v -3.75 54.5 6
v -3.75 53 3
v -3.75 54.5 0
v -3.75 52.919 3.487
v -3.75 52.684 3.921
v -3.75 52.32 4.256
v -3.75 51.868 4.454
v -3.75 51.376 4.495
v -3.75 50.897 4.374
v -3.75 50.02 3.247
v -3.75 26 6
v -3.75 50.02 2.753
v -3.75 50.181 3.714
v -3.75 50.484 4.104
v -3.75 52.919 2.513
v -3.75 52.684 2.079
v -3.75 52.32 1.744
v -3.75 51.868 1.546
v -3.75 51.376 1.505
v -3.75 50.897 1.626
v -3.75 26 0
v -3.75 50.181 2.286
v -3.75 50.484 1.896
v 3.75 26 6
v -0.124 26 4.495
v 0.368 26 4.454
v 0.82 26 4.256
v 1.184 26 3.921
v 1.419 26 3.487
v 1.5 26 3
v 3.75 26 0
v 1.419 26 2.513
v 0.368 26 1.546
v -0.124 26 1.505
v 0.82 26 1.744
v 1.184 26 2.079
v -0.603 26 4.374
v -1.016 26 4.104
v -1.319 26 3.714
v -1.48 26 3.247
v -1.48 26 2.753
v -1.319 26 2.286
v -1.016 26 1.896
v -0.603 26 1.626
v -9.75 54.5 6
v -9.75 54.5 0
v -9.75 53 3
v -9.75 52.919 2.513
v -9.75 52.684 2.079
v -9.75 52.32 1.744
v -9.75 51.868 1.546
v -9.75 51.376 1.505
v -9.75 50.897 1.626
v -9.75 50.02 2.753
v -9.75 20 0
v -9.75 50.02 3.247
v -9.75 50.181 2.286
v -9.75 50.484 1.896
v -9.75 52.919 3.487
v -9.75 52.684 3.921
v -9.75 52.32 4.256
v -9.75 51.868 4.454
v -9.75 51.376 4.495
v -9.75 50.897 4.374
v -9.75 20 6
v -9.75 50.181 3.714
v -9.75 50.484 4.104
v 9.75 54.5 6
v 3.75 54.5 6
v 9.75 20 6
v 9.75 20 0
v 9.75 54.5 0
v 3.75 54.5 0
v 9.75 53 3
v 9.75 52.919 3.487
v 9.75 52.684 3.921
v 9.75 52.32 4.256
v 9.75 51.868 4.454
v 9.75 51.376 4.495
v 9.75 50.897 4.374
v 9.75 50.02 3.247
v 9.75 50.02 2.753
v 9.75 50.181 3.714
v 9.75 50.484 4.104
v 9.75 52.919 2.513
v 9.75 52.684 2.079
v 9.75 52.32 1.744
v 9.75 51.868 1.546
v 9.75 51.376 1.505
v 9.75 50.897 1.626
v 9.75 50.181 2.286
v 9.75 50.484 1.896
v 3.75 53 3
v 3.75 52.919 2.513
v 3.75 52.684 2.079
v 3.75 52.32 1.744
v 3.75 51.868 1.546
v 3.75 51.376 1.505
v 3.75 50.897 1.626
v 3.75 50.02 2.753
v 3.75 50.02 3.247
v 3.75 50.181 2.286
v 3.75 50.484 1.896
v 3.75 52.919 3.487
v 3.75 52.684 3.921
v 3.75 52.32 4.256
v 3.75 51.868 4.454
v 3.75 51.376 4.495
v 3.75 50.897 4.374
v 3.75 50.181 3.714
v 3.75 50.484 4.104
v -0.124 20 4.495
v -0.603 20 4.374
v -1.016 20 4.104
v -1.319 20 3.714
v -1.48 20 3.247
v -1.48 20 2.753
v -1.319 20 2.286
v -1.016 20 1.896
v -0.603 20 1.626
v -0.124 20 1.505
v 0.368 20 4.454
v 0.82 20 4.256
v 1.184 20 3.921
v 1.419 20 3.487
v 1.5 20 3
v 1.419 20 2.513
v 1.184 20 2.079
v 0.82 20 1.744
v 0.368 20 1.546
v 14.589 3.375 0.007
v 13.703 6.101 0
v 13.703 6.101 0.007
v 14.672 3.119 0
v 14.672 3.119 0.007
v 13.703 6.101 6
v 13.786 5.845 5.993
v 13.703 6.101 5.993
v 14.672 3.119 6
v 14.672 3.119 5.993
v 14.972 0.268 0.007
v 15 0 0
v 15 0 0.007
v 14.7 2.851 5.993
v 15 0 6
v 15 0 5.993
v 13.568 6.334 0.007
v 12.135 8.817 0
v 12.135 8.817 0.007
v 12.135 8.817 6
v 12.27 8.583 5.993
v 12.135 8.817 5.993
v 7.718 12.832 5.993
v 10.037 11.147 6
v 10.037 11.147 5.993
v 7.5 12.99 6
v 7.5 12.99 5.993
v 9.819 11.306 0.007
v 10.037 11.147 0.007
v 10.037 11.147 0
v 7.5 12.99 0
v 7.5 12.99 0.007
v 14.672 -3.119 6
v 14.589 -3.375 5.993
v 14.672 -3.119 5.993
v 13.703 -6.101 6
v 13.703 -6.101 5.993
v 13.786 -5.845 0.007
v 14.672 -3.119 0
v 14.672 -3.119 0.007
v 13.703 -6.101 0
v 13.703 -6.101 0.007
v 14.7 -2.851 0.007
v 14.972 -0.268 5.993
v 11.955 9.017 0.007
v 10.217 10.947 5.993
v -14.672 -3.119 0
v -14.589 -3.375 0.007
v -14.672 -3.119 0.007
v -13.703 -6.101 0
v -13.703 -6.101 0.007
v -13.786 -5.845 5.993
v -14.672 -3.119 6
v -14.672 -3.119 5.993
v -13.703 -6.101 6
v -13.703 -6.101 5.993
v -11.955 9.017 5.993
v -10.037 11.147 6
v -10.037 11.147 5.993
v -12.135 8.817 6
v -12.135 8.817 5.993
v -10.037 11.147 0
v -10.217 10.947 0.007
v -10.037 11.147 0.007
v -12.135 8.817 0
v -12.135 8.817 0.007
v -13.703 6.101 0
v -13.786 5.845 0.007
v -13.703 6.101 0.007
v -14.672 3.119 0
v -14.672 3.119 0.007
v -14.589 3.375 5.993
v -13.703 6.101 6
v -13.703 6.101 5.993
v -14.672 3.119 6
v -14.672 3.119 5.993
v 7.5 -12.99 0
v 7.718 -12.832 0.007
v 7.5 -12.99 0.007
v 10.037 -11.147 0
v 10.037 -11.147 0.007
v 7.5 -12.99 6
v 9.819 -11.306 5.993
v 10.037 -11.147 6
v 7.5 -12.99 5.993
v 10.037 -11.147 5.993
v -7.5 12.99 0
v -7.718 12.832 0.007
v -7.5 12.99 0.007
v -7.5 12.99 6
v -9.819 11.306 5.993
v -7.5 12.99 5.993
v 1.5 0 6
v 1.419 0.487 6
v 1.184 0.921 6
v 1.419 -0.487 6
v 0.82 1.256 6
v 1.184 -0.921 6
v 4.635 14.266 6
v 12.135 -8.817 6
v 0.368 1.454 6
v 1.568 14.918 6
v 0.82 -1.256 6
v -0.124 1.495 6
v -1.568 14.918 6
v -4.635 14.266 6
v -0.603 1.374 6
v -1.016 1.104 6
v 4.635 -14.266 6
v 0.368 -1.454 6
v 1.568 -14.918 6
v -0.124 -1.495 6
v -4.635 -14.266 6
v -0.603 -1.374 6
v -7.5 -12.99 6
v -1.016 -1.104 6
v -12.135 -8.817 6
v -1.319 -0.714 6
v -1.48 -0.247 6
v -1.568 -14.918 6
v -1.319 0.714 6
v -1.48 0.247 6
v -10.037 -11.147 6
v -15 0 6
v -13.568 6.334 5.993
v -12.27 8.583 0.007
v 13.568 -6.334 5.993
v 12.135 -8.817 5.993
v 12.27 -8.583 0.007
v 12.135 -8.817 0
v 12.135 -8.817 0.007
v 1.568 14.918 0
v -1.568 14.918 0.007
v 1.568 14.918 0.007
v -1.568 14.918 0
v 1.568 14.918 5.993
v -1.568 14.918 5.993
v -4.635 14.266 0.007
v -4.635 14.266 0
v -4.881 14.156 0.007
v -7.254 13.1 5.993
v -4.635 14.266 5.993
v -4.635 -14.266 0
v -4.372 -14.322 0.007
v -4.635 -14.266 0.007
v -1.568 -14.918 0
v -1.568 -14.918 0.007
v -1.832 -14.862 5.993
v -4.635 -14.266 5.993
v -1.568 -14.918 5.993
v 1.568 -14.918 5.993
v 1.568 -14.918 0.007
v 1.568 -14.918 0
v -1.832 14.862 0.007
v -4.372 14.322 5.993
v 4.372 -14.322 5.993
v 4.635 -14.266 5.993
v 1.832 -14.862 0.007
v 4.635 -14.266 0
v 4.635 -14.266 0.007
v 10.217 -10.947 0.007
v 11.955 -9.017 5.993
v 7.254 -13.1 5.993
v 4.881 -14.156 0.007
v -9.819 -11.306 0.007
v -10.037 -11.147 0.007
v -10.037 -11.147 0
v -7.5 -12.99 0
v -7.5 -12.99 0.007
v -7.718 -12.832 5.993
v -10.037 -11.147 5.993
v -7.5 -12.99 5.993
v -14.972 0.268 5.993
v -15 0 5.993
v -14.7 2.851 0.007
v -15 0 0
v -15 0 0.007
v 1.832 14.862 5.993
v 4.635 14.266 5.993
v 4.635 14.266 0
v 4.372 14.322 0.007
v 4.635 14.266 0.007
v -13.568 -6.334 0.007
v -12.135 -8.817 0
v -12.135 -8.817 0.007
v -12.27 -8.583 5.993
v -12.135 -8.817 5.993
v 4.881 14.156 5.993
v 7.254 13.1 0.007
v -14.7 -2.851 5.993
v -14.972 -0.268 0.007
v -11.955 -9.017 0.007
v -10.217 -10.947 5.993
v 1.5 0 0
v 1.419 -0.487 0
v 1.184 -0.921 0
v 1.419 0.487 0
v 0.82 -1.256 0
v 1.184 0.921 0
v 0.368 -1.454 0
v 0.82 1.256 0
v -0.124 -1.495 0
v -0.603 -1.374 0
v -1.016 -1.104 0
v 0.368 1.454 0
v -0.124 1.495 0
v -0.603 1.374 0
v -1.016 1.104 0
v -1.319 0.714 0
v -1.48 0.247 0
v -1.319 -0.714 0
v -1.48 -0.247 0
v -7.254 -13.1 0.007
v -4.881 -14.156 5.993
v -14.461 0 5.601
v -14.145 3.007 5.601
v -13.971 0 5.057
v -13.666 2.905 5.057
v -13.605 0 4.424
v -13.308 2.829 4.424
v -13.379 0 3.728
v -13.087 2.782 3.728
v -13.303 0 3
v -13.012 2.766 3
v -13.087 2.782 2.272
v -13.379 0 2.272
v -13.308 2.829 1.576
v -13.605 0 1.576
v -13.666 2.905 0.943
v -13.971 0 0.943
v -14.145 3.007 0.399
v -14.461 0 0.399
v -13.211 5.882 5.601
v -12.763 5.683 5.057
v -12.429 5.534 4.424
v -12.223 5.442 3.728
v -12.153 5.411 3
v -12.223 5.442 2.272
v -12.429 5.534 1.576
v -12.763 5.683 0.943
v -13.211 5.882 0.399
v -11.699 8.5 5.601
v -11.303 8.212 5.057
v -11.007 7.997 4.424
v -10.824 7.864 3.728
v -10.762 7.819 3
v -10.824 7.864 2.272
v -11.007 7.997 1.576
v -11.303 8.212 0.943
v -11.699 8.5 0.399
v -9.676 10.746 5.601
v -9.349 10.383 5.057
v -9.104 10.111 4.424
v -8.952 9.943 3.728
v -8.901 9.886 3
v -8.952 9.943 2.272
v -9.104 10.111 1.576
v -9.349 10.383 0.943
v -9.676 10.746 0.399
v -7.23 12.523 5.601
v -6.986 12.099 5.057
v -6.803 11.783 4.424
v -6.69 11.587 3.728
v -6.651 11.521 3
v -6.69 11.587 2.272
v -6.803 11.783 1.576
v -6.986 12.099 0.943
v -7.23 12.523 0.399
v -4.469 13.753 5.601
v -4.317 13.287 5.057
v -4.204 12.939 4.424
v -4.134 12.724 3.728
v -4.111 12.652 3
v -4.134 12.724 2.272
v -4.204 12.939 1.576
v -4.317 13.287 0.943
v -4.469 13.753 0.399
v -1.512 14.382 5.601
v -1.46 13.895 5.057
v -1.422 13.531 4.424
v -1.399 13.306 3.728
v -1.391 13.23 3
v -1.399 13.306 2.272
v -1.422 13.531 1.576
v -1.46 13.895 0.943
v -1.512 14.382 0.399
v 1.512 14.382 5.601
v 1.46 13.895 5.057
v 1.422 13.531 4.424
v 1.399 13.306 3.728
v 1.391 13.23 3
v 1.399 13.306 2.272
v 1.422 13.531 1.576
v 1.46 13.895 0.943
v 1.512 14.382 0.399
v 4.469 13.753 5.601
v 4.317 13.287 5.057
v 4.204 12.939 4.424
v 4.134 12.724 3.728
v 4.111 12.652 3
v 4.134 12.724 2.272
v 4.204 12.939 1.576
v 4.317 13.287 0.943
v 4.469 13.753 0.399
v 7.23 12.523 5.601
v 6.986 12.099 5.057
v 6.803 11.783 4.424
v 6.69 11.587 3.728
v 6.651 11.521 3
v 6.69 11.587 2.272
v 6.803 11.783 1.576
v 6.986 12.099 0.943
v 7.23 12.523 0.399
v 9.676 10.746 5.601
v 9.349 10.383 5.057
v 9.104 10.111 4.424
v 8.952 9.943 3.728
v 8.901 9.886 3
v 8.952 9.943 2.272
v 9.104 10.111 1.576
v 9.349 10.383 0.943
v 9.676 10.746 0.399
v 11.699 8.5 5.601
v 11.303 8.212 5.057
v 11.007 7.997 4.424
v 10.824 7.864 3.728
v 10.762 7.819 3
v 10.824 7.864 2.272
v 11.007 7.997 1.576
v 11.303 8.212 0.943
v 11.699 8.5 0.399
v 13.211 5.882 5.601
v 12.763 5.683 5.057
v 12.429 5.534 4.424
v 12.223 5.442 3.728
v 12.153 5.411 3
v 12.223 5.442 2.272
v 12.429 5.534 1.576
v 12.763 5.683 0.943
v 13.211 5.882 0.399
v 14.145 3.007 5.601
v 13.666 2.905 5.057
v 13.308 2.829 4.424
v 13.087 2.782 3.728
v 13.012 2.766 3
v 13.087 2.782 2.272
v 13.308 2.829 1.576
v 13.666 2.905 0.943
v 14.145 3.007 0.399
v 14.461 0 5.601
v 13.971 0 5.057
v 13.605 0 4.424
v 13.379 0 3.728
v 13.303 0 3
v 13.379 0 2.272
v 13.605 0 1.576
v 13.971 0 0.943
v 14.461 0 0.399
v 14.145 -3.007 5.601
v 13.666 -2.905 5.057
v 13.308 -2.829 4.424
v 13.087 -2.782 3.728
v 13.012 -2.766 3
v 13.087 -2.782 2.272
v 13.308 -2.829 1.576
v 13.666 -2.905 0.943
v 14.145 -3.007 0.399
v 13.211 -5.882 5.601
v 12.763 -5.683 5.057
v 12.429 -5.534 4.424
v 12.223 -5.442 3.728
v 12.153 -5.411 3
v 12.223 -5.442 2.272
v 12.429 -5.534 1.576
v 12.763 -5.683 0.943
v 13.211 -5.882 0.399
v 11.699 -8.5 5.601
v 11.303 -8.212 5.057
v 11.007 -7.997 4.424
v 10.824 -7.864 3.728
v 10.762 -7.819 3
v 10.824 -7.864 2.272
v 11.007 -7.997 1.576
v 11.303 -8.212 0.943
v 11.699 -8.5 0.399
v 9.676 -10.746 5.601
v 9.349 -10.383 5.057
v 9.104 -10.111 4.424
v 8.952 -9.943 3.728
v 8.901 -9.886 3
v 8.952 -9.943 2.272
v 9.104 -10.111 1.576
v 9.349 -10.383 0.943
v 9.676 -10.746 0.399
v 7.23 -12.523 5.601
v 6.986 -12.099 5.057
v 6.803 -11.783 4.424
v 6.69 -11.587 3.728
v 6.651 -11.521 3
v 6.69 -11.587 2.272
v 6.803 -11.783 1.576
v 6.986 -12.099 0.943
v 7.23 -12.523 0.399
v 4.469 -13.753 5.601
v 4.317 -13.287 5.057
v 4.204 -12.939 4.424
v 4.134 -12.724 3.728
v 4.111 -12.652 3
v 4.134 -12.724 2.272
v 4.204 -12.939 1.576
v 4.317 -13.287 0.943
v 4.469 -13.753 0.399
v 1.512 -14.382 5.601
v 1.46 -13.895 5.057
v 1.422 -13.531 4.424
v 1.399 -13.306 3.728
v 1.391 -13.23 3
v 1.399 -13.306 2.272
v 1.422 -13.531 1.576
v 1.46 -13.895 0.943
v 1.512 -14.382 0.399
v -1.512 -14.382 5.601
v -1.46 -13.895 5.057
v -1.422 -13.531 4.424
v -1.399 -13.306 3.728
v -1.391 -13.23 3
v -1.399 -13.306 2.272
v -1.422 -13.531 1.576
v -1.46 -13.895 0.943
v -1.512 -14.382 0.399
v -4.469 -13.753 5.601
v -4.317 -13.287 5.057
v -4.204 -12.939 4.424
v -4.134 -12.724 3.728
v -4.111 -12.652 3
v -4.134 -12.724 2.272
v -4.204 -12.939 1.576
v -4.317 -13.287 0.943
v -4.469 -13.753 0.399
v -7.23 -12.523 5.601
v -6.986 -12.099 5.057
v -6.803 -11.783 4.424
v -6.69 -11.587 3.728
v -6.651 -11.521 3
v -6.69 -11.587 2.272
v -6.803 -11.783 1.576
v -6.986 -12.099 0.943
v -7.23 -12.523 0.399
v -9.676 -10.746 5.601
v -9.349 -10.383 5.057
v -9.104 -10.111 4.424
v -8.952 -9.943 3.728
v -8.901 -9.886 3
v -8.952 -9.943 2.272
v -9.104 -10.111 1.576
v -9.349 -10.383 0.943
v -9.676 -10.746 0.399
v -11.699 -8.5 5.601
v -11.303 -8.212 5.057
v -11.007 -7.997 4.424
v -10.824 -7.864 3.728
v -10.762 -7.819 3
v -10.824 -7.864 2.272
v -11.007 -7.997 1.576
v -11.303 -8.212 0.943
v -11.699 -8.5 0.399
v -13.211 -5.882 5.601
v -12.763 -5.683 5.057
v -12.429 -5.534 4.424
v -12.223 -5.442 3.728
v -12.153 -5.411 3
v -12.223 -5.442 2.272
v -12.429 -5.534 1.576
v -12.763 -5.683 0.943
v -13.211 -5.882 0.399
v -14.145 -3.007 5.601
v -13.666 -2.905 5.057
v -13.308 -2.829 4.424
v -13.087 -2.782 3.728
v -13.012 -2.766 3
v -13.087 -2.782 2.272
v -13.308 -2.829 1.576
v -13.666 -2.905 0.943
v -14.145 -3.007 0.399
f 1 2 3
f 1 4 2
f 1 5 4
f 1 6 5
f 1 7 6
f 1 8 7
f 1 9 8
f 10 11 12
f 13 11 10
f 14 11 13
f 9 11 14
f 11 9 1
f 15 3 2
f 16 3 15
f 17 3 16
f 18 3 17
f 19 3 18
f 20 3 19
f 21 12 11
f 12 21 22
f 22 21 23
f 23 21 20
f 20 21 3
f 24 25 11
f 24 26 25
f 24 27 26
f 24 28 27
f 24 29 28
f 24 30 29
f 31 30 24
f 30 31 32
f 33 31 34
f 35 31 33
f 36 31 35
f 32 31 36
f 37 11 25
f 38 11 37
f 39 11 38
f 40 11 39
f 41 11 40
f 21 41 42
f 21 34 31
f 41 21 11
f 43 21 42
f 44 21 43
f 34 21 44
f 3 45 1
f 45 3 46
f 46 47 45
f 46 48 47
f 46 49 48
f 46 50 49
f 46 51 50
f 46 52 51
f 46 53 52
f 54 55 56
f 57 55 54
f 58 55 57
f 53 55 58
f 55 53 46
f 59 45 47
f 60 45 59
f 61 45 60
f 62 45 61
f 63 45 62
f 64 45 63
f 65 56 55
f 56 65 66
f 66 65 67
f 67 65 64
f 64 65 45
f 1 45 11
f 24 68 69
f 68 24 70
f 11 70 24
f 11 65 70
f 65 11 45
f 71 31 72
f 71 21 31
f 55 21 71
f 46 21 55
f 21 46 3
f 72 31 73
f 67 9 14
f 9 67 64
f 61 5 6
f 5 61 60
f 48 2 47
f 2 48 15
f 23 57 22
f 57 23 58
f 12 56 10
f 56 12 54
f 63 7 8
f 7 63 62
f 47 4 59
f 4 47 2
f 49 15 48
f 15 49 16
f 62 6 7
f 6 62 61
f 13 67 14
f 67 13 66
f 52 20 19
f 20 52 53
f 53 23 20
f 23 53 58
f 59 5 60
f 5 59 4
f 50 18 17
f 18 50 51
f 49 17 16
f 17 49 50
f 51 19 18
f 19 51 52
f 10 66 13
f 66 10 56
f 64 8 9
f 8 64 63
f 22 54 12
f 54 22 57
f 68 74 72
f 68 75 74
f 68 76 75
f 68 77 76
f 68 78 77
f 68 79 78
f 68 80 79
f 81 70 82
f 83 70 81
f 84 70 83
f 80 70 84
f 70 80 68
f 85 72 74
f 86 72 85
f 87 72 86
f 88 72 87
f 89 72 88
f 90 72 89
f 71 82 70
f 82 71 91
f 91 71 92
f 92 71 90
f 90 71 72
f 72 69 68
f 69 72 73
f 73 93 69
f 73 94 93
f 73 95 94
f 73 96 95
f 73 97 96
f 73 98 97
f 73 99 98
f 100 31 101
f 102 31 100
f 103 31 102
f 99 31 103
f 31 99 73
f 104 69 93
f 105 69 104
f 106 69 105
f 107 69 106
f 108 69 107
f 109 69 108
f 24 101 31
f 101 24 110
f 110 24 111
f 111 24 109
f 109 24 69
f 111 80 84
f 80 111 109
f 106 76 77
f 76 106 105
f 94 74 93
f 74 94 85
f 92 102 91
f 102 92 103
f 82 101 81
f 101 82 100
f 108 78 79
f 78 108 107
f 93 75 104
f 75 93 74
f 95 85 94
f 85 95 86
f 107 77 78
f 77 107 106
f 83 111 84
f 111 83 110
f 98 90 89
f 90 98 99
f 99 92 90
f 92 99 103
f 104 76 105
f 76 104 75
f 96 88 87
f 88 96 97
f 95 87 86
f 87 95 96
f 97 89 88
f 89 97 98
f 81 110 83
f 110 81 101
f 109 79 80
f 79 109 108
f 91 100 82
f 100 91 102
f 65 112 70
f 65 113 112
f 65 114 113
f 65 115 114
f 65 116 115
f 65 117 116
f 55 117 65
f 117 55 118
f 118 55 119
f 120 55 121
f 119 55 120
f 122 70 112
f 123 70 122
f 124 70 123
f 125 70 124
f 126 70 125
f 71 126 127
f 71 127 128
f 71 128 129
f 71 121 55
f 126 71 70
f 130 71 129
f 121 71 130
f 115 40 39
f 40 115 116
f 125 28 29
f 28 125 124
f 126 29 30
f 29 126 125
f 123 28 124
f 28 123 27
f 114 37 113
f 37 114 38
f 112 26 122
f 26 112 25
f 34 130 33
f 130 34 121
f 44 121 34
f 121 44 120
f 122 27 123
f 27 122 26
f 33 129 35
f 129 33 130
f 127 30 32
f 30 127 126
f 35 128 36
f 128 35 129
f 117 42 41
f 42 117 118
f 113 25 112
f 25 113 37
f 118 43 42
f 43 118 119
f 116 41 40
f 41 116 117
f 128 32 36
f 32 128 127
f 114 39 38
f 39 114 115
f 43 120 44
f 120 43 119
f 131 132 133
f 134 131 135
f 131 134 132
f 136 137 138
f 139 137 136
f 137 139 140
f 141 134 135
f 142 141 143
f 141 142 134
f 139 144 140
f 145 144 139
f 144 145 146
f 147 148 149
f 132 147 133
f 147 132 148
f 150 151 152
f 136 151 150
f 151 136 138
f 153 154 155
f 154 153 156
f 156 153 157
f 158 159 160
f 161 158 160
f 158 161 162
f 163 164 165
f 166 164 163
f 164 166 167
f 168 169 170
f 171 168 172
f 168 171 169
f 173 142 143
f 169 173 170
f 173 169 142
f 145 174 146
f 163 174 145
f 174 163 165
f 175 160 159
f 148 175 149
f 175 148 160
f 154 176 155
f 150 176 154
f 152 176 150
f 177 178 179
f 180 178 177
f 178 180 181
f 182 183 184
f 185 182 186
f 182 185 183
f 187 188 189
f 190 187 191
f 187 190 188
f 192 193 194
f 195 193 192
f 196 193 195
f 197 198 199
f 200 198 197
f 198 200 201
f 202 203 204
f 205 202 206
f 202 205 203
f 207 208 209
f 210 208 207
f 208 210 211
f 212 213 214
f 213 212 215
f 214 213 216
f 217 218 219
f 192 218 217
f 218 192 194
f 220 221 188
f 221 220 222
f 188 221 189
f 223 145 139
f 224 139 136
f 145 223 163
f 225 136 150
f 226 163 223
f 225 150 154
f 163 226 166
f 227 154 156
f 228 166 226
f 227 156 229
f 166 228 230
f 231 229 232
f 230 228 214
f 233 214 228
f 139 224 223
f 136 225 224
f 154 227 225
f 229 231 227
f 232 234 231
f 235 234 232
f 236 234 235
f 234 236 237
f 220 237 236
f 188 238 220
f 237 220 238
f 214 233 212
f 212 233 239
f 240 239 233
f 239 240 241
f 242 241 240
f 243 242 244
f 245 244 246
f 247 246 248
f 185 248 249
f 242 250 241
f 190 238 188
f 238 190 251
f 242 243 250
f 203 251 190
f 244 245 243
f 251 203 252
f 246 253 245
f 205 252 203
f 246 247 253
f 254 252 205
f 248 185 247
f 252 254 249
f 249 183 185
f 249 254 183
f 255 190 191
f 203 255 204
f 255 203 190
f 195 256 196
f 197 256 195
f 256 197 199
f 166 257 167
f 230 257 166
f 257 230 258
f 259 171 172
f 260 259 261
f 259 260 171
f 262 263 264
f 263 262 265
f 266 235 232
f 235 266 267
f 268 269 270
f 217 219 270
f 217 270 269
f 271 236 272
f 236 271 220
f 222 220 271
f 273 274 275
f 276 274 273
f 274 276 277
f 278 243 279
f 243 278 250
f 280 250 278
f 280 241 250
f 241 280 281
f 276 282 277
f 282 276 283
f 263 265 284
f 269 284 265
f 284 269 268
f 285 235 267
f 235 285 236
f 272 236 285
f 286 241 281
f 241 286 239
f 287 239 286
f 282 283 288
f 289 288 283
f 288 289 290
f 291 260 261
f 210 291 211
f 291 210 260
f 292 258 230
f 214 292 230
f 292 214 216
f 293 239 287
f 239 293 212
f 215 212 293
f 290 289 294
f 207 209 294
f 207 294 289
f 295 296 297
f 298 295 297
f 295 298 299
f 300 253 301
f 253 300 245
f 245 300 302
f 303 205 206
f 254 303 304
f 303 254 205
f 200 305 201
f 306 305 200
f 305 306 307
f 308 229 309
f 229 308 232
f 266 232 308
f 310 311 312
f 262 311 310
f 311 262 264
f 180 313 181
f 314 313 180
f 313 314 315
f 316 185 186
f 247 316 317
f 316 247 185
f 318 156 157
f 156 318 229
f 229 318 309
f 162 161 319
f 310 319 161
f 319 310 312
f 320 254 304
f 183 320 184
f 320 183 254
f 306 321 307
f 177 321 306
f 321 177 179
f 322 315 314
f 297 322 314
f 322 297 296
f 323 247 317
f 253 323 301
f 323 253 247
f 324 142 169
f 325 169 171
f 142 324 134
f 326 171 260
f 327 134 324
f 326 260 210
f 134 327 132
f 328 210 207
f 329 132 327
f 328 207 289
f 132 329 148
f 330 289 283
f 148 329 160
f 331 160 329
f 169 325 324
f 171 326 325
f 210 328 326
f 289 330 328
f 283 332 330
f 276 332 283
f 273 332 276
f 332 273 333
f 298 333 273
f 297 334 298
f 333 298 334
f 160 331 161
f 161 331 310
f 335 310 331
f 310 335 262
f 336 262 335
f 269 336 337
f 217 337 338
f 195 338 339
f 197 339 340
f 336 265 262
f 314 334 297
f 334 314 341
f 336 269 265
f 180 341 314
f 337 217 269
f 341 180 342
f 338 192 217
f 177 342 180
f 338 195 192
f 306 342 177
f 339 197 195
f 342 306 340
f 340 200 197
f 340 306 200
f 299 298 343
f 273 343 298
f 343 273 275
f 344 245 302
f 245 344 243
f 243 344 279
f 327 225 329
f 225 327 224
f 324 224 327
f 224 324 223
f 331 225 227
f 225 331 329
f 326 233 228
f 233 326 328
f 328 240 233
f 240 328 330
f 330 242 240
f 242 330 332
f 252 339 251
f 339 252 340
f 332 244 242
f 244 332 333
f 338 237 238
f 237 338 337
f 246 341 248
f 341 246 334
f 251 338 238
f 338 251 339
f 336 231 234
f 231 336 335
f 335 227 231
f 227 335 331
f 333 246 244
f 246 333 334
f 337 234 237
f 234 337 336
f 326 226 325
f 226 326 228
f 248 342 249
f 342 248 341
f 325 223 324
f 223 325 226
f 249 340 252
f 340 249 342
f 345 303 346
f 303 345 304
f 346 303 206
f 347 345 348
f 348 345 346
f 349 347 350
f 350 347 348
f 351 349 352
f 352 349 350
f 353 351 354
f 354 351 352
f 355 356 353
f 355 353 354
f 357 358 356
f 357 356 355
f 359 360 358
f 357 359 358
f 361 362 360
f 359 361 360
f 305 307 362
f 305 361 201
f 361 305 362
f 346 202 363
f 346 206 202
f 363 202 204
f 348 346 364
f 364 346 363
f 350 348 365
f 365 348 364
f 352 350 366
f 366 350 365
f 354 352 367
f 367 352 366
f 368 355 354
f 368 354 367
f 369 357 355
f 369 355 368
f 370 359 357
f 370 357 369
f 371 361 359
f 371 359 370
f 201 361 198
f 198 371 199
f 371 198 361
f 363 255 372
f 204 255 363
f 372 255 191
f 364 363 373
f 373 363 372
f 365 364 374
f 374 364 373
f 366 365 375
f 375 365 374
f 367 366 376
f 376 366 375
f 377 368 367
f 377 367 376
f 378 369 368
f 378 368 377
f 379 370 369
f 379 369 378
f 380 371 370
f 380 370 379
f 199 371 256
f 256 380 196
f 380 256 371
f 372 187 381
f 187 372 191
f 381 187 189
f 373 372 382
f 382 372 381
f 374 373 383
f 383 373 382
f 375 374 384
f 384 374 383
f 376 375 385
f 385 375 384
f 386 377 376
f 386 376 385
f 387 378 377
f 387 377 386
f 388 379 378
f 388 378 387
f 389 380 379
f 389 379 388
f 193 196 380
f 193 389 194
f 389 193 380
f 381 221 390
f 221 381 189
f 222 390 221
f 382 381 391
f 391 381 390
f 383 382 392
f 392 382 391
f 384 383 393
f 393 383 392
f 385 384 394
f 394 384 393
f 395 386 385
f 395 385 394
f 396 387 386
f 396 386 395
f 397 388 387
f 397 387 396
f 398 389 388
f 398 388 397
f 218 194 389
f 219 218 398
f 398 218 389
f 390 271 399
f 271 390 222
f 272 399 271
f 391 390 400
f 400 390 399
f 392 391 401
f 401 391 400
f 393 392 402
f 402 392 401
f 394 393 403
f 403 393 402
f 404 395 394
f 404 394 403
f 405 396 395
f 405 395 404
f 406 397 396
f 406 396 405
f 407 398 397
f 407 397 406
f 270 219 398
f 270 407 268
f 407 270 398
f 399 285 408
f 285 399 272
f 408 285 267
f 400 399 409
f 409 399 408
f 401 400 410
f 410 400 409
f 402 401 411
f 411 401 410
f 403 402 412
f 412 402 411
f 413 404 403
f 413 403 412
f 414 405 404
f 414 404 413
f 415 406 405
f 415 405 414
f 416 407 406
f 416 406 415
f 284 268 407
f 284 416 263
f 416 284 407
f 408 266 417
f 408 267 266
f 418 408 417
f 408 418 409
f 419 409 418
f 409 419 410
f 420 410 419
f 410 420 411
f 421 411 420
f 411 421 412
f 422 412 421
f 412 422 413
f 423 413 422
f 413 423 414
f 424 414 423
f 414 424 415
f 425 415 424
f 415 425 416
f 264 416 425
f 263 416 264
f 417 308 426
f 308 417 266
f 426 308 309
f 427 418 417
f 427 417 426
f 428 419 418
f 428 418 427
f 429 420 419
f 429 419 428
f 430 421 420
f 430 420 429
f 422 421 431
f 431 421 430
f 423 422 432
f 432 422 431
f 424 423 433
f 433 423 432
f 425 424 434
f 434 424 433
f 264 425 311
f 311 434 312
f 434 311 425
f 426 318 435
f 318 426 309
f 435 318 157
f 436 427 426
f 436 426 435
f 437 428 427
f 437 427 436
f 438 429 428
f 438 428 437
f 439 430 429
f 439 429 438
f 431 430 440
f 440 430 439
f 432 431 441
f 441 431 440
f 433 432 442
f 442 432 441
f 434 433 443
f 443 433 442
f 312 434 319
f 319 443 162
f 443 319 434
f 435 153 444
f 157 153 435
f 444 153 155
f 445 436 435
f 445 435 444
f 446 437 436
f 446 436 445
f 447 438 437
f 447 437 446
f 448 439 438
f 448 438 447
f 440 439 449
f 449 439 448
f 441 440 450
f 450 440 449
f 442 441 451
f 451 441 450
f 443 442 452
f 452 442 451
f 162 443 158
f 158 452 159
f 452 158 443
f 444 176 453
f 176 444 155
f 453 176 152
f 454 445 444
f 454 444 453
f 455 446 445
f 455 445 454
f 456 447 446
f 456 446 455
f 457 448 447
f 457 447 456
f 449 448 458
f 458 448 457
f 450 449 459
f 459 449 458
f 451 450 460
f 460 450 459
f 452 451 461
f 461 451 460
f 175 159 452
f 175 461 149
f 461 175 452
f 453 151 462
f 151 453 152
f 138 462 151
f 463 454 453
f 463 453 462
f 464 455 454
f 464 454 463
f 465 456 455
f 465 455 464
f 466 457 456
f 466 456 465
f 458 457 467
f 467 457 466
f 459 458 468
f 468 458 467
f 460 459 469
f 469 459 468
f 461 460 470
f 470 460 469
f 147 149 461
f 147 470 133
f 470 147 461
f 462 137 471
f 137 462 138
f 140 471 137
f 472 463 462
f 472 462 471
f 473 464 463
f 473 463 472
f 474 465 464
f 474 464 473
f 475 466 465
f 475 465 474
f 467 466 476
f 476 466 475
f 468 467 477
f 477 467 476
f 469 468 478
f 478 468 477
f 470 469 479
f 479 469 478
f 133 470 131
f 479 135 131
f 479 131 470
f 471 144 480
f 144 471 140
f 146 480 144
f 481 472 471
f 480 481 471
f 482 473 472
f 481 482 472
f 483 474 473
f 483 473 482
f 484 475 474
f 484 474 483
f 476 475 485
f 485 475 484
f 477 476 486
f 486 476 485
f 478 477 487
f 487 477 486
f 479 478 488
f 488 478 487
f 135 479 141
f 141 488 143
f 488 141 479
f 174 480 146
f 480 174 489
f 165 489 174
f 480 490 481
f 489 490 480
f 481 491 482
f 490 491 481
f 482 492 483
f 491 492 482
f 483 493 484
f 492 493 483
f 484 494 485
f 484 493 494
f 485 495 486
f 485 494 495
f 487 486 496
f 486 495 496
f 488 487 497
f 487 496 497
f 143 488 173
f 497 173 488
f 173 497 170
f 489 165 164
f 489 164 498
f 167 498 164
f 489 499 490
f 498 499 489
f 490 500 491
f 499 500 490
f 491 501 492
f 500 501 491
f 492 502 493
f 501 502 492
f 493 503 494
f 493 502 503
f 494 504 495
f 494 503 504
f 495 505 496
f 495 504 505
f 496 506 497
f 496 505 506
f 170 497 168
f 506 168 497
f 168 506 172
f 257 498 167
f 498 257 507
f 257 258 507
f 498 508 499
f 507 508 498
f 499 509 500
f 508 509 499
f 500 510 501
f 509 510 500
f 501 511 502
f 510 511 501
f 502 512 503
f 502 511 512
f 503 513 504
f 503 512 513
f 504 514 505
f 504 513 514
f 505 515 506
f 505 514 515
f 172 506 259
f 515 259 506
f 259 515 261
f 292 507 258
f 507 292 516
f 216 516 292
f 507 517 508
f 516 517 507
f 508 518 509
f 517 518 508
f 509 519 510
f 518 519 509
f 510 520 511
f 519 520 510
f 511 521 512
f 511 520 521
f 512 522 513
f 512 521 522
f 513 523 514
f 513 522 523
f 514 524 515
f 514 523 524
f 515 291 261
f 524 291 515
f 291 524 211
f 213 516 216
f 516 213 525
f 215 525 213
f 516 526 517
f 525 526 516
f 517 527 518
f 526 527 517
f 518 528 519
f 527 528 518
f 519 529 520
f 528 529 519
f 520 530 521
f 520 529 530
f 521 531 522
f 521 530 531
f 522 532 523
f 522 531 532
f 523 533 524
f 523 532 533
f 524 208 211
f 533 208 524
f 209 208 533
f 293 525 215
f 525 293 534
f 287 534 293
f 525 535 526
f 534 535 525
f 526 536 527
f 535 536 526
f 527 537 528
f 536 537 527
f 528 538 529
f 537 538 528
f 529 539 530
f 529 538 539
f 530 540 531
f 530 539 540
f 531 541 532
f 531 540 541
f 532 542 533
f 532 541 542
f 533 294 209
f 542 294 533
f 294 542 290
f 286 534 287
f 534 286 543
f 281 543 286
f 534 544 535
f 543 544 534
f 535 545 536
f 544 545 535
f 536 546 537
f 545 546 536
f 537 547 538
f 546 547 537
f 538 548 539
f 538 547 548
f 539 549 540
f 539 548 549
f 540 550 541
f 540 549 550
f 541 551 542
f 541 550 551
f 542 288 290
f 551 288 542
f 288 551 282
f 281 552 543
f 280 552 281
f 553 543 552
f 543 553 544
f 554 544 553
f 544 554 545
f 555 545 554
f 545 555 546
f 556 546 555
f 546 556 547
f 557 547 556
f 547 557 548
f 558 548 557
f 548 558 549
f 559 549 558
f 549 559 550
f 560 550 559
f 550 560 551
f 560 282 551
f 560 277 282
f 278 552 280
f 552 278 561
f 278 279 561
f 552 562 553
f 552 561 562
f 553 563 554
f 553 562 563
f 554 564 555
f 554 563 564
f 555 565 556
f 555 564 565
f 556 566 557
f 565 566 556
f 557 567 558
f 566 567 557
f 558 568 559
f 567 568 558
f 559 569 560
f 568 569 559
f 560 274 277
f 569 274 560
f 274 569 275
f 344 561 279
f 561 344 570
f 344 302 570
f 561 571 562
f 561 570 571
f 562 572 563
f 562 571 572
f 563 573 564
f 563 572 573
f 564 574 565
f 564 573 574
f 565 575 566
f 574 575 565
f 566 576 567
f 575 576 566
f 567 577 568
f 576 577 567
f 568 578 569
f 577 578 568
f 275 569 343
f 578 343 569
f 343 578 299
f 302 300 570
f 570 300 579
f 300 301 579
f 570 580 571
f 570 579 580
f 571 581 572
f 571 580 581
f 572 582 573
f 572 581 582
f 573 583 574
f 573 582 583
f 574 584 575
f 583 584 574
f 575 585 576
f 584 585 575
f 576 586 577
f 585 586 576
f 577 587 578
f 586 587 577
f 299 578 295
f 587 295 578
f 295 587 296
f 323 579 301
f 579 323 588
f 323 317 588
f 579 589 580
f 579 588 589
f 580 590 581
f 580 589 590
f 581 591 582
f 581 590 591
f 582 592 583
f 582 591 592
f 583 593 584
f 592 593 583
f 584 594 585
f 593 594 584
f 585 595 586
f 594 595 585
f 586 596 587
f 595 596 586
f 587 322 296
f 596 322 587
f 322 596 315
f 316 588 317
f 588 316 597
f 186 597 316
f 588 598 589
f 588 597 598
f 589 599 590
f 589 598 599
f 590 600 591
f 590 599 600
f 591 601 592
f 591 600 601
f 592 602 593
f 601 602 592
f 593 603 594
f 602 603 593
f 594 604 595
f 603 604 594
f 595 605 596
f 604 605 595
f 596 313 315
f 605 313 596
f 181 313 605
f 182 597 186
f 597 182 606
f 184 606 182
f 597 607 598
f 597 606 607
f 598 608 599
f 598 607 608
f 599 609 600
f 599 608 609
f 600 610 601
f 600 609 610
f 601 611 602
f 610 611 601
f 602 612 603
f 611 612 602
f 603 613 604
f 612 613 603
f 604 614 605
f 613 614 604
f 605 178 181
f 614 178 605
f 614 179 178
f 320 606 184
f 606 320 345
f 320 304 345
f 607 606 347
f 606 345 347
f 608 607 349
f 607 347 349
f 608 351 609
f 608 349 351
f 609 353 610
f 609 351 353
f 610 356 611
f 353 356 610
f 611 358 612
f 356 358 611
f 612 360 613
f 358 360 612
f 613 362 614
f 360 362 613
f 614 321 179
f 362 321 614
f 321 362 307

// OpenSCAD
// Thickness of the arms.
arm_width = 6;
// Diameter of the pully wheel
pully_diameter = 30;
// Width of the pully wheel (should be larger than your rope/string)
pully_width = 6;
// space, or slop, between the wheel and the arms.  Make this smaller for better printers
space = 1.5;
// Diameter of both the pin/shieve hole and the hole at the top of the arms 
hole_diameter = 3;
// Diameter of a rope that would lay perfectly in the groove in the pully (should probably be bigger than your actual rope
rope = 7;

// minimum fragment size when making a circle - smaller = smoother
$fs = 0.5;
// number of fragments in a circle - bigger = smoother
$fn = 0;

ropeu = rope < pully_width ? pully_width : rope; 

echo(ropeu);

rope_xtra = sqrt(pow(ropeu/2,2)-pow(pully_width/2,2)); 

echo(rope_xtra);

rope_dist = pully_diameter/2 + rope_xtra;
echo("Rope Dist ",rope_dist);

b_arm_len = (pully_diameter/2)+space+arm_width*2;
b_arm_spread = arm_width*2 + space + pully_width;
b_x_mid = arm_width + space/2 +(pully_width/2);

module hole (v=[-space,(arm_width/2),arm_width/2],r=[0,90,0]) {
    difference (x) {
        children();
        #translate(v) rotate(r)
        cylinder(h=arm_width+space*2,d=hole_diameter);
    }
}

module armu () {
    hole() cube([arm_width,arm_width,b_arm_len]);
}

translate([-b_arm_spread/2,pully_diameter/2+5+b_arm_len+arm_width,0]) rotate([90,0,0]) {
    armu();
    translate ([arm_width + space + pully_width,0,0]) armu();
    hole([b_x_mid,arm_width/2,b_arm_len-space],[0,0,0]) translate ( [0,0,b_arm_len] ) cube( [b_arm_spread, arm_width, arm_width ] );
}


 translate([0,0,0]) rotate([0,0,0]) difference () {
  cylinder(h=pully_width, d=pully_diameter);
  translate([0,0,-space]) cylinder(h=pully_width+space*2,d=hole_diameter);  
  translate([0,0,(pully_width/2)]) rotate_extrude() { 
    translate([rope_dist,0,0]) circle(d=ropeu);
  }
}
